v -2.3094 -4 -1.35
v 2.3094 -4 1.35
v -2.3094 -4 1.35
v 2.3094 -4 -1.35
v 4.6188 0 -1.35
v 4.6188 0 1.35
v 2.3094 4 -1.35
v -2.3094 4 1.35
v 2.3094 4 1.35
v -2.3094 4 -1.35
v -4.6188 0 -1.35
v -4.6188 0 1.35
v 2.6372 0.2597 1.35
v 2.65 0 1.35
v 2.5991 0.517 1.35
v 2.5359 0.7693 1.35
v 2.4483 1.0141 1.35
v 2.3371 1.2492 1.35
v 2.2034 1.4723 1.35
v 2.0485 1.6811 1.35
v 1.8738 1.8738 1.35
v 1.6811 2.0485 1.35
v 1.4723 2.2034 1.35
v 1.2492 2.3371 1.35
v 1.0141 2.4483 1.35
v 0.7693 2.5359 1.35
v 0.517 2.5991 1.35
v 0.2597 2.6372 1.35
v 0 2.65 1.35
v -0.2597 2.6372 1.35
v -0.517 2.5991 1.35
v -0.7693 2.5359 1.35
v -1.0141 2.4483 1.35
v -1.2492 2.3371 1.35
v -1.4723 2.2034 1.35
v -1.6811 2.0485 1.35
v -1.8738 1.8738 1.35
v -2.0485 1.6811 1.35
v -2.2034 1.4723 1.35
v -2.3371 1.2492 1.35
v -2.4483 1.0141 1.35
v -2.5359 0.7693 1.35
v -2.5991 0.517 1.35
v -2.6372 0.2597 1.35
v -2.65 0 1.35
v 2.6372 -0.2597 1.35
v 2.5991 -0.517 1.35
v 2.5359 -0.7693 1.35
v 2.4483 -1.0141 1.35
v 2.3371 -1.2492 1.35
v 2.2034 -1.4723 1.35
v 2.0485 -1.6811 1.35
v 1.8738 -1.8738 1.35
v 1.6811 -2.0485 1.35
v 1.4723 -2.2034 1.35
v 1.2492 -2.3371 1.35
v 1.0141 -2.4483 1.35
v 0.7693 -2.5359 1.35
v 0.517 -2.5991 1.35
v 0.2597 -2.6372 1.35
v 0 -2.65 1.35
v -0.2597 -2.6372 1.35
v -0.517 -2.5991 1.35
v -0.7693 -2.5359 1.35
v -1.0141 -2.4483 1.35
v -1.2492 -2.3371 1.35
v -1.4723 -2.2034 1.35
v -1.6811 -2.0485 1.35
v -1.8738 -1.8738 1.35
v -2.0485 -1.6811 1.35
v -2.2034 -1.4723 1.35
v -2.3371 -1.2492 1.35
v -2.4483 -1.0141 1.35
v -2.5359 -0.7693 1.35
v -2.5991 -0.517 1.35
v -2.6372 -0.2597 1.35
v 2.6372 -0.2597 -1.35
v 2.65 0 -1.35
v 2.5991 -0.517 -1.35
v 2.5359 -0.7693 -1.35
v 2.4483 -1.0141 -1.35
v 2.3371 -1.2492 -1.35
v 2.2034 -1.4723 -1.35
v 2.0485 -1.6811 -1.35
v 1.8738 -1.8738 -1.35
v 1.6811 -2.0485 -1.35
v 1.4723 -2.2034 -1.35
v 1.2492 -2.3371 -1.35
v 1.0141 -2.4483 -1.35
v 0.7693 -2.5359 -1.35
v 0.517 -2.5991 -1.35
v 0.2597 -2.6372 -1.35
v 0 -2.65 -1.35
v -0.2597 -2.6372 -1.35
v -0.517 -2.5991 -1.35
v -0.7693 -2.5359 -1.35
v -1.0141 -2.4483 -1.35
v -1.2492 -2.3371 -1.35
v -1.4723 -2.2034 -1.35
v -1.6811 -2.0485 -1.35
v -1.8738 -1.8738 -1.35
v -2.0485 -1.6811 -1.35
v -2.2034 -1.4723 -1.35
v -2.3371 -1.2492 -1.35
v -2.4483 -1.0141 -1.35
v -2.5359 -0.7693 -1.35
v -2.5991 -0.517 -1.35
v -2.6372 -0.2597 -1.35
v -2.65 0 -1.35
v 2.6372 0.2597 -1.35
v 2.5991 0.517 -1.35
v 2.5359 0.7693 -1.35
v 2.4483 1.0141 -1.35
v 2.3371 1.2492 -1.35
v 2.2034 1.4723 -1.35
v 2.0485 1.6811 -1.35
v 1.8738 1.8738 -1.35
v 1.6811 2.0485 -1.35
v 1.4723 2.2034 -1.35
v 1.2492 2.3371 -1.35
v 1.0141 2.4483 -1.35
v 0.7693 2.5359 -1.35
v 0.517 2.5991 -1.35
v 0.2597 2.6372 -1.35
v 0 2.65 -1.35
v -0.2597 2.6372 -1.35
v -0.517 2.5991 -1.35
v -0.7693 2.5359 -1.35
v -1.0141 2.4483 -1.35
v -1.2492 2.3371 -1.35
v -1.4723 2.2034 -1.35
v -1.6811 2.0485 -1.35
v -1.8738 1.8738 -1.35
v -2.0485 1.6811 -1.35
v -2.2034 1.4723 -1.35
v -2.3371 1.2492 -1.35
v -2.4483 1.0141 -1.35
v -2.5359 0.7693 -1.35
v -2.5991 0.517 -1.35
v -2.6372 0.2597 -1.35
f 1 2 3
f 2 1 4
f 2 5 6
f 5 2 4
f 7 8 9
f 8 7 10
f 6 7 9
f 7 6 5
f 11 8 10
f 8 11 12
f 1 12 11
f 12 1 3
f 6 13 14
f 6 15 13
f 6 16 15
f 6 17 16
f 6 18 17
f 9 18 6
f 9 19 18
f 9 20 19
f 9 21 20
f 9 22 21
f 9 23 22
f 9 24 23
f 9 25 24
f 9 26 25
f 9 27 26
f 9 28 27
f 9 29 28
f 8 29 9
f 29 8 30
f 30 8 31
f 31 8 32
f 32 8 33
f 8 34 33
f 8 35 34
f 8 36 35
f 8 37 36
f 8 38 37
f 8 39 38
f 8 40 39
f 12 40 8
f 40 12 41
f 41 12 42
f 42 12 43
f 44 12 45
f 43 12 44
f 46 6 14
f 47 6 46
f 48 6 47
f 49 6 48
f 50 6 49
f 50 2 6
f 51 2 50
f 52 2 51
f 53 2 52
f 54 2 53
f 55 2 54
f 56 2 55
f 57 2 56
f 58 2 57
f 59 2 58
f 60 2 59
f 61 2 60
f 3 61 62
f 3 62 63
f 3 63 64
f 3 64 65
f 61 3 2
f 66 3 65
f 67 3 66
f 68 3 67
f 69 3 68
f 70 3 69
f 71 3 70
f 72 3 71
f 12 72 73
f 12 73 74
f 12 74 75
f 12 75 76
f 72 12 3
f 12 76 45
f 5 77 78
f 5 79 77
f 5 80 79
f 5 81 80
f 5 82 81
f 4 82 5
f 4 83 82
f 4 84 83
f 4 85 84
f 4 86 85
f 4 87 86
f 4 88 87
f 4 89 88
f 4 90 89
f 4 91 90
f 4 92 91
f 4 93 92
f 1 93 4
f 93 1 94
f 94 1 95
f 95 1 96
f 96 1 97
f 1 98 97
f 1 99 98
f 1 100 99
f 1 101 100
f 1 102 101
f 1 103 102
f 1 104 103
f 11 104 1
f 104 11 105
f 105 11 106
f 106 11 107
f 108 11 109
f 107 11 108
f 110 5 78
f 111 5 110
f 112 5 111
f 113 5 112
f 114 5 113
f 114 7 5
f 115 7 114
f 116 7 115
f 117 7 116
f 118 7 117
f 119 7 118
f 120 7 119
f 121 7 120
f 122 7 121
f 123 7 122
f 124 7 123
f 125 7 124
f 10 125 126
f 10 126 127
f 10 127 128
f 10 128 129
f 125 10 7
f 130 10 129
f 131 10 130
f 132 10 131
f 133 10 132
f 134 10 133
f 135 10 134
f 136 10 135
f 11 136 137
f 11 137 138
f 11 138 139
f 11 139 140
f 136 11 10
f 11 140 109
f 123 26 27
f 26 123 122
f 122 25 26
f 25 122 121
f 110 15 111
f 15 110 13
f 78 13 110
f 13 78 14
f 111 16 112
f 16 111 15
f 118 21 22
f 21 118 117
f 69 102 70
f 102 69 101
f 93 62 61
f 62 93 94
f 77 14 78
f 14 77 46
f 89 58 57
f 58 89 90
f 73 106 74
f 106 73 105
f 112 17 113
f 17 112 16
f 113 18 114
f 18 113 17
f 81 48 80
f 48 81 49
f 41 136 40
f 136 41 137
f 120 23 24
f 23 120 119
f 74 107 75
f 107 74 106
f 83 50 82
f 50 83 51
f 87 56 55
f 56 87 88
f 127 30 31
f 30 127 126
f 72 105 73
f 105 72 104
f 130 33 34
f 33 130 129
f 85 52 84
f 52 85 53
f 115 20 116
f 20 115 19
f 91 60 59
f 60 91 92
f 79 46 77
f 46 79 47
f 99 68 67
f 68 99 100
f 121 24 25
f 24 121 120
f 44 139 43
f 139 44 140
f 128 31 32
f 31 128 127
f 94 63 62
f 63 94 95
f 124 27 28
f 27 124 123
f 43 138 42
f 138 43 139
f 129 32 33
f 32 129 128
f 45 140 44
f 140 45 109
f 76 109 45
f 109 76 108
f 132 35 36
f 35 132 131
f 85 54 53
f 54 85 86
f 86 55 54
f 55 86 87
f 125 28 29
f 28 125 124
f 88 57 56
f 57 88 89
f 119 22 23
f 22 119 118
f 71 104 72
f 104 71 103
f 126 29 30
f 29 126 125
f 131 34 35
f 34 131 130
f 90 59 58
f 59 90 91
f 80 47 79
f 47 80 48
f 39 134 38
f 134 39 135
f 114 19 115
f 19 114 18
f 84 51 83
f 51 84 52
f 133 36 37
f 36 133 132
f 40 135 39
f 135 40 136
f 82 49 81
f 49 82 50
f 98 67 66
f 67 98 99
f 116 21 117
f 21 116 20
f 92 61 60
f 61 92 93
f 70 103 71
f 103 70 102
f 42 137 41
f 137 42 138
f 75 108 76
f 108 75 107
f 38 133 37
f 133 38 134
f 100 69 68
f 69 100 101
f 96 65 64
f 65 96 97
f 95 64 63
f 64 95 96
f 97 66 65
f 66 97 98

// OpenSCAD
$fn=64;

module hex_prism(af=8.0, h=2.7){
    r = af / sqrt(3);
    cylinder(h=h, r=r, center=true, $fn=6);
}

module clearance_hole(d=5.0, h=2.7){
    cylinder(h=h+0.4, d=d+0.3, center=true, $fn=64);
}

module thin_hex_nut(af=8.0, thickness=2.7, screw_d=5.0){
    difference(){
        hex_prism(af=af, h=thickness);
        clearance_hole(d=screw_d, h=thickness);
    }
}

thin_hex_nut(af=8.0, thickness=2.7, screw_d=5.0);
